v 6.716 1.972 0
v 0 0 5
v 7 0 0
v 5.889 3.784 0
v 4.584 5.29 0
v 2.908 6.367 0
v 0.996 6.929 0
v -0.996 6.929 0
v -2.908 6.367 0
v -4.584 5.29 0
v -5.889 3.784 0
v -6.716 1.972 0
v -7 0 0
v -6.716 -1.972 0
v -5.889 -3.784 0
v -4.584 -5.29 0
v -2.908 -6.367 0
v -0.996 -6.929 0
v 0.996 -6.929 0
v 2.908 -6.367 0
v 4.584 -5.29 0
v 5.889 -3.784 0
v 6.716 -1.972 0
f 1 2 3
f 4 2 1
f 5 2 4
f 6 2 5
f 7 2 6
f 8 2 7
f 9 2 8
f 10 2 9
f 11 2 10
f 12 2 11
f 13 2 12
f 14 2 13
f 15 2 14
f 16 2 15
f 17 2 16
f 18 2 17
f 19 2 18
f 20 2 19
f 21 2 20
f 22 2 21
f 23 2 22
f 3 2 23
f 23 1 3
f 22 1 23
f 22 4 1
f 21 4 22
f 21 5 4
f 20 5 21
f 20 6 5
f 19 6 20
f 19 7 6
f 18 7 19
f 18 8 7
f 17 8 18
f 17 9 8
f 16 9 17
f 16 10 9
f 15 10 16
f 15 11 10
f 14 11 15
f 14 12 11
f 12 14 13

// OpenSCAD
// Generated by SolidPython 1.0.1 on 2020-07-29 00:46:43


cylinder(h = 5, r1 = 7, r2 = 0);
/***********************************************
*********      SolidPython code:      **********
************************************************
 
# import packages: SolidPython
from solid import *
from solid.utils import *
from itertools import chain, combinations, permutations


class Resize:

    def __init__(self, scad_file):
        self.scad_file = scad_file
        #self.scad_file = import_scad(scad_file)
        # cone/cylinder param:
        self.r1 = 0
        self.r2 = 0
        self.h = 0
        # rectangular prism param:
        self.w = 0
        self.l = 0
        # ellipse param:
        self.r = 0

    # import OpenScad code (file name corresponds to shape)


    # classify shape + parameters
    def assign(self, param1, param2, param3):
        if self.scad_file == 'cone.scad':
            self.r1 = param1
            self.r2 = param2
            self.h = param3
        elif self.scad_file == 'cylinder.scad':
            self.r1 = param1
            self.r2 = param2
            self.h = param3
        elif self.scad_file == 'rectangularPrism.scad':
            self.h = param1
            self.l = param2
            self.w = param3
        else:
            self.r = param1
            self.h = param2

    # resize parameters
    def iterate(self):
        x = range(3, 20, 2)
        i = 1
        if self.scad_file == 'cone.scad':
            tempList = list(permutations(x, 2))
            for temp in tempList:
                param1 = temp[0]
                param2 = temp[1]
                filepath = 'produced_scad_files/' + 'cone' + str(param1) + '_' + str(param2) + '_' + '.scad'
                scad_render_to_file(cylinder(h=param1, r1=param2, r2=0), filepath)

        elif self.scad_file == 'cylinder.scad':
            tempList = list(permutations(x, 3))
            for temp in tempList:
                param1 = temp[0]
                param2 = temp[1]
                filepath = 'produced_scad_files/' + 'cylinder' + str(param1) + '_' + str(param2) + '_' + '.scad'
                scad_render_to_file(cylinder(h=param1, r1=param2, r2=param2), filepath)

        elif self.scad_file == 'rectangularPrism.scad':
            tempList = list(permutations(x, 3))
            for temp in tempList:
                param1 = temp[0]
                param2 = temp[1]
                param3 = temp[2]
                filepath = 'produced_scad_files/' + 'rectangularPrism' + str(param1) + '_' + str(param2) + '_' + str(
                    param3) + '.scad'
                scad_render_to_file(cube(size=(param1, param2, param3)), filepath)

        elif self.scad_file == 'ellipse.scad':
            tempList = list(permutations(x, 4))
            for temp in tempList:
                param1 = temp[0]
                param2 = temp[1]
                param3 = temp[2]
                param4 = temp[3]
                filepath = 'produced_scad_files/' + 'ellipse' + str(param1) + '_' + str(param2) + '_' + str(param3) + '_' + str(param4) + '.scad'
                scad_render_to_file(scale([param1, param2, param3])(sphere(r=param4)), filepath)

    def render_to_scadfile(self):
        scad_render_to_file(scad, 'example.scad') 
 
************************************************/
